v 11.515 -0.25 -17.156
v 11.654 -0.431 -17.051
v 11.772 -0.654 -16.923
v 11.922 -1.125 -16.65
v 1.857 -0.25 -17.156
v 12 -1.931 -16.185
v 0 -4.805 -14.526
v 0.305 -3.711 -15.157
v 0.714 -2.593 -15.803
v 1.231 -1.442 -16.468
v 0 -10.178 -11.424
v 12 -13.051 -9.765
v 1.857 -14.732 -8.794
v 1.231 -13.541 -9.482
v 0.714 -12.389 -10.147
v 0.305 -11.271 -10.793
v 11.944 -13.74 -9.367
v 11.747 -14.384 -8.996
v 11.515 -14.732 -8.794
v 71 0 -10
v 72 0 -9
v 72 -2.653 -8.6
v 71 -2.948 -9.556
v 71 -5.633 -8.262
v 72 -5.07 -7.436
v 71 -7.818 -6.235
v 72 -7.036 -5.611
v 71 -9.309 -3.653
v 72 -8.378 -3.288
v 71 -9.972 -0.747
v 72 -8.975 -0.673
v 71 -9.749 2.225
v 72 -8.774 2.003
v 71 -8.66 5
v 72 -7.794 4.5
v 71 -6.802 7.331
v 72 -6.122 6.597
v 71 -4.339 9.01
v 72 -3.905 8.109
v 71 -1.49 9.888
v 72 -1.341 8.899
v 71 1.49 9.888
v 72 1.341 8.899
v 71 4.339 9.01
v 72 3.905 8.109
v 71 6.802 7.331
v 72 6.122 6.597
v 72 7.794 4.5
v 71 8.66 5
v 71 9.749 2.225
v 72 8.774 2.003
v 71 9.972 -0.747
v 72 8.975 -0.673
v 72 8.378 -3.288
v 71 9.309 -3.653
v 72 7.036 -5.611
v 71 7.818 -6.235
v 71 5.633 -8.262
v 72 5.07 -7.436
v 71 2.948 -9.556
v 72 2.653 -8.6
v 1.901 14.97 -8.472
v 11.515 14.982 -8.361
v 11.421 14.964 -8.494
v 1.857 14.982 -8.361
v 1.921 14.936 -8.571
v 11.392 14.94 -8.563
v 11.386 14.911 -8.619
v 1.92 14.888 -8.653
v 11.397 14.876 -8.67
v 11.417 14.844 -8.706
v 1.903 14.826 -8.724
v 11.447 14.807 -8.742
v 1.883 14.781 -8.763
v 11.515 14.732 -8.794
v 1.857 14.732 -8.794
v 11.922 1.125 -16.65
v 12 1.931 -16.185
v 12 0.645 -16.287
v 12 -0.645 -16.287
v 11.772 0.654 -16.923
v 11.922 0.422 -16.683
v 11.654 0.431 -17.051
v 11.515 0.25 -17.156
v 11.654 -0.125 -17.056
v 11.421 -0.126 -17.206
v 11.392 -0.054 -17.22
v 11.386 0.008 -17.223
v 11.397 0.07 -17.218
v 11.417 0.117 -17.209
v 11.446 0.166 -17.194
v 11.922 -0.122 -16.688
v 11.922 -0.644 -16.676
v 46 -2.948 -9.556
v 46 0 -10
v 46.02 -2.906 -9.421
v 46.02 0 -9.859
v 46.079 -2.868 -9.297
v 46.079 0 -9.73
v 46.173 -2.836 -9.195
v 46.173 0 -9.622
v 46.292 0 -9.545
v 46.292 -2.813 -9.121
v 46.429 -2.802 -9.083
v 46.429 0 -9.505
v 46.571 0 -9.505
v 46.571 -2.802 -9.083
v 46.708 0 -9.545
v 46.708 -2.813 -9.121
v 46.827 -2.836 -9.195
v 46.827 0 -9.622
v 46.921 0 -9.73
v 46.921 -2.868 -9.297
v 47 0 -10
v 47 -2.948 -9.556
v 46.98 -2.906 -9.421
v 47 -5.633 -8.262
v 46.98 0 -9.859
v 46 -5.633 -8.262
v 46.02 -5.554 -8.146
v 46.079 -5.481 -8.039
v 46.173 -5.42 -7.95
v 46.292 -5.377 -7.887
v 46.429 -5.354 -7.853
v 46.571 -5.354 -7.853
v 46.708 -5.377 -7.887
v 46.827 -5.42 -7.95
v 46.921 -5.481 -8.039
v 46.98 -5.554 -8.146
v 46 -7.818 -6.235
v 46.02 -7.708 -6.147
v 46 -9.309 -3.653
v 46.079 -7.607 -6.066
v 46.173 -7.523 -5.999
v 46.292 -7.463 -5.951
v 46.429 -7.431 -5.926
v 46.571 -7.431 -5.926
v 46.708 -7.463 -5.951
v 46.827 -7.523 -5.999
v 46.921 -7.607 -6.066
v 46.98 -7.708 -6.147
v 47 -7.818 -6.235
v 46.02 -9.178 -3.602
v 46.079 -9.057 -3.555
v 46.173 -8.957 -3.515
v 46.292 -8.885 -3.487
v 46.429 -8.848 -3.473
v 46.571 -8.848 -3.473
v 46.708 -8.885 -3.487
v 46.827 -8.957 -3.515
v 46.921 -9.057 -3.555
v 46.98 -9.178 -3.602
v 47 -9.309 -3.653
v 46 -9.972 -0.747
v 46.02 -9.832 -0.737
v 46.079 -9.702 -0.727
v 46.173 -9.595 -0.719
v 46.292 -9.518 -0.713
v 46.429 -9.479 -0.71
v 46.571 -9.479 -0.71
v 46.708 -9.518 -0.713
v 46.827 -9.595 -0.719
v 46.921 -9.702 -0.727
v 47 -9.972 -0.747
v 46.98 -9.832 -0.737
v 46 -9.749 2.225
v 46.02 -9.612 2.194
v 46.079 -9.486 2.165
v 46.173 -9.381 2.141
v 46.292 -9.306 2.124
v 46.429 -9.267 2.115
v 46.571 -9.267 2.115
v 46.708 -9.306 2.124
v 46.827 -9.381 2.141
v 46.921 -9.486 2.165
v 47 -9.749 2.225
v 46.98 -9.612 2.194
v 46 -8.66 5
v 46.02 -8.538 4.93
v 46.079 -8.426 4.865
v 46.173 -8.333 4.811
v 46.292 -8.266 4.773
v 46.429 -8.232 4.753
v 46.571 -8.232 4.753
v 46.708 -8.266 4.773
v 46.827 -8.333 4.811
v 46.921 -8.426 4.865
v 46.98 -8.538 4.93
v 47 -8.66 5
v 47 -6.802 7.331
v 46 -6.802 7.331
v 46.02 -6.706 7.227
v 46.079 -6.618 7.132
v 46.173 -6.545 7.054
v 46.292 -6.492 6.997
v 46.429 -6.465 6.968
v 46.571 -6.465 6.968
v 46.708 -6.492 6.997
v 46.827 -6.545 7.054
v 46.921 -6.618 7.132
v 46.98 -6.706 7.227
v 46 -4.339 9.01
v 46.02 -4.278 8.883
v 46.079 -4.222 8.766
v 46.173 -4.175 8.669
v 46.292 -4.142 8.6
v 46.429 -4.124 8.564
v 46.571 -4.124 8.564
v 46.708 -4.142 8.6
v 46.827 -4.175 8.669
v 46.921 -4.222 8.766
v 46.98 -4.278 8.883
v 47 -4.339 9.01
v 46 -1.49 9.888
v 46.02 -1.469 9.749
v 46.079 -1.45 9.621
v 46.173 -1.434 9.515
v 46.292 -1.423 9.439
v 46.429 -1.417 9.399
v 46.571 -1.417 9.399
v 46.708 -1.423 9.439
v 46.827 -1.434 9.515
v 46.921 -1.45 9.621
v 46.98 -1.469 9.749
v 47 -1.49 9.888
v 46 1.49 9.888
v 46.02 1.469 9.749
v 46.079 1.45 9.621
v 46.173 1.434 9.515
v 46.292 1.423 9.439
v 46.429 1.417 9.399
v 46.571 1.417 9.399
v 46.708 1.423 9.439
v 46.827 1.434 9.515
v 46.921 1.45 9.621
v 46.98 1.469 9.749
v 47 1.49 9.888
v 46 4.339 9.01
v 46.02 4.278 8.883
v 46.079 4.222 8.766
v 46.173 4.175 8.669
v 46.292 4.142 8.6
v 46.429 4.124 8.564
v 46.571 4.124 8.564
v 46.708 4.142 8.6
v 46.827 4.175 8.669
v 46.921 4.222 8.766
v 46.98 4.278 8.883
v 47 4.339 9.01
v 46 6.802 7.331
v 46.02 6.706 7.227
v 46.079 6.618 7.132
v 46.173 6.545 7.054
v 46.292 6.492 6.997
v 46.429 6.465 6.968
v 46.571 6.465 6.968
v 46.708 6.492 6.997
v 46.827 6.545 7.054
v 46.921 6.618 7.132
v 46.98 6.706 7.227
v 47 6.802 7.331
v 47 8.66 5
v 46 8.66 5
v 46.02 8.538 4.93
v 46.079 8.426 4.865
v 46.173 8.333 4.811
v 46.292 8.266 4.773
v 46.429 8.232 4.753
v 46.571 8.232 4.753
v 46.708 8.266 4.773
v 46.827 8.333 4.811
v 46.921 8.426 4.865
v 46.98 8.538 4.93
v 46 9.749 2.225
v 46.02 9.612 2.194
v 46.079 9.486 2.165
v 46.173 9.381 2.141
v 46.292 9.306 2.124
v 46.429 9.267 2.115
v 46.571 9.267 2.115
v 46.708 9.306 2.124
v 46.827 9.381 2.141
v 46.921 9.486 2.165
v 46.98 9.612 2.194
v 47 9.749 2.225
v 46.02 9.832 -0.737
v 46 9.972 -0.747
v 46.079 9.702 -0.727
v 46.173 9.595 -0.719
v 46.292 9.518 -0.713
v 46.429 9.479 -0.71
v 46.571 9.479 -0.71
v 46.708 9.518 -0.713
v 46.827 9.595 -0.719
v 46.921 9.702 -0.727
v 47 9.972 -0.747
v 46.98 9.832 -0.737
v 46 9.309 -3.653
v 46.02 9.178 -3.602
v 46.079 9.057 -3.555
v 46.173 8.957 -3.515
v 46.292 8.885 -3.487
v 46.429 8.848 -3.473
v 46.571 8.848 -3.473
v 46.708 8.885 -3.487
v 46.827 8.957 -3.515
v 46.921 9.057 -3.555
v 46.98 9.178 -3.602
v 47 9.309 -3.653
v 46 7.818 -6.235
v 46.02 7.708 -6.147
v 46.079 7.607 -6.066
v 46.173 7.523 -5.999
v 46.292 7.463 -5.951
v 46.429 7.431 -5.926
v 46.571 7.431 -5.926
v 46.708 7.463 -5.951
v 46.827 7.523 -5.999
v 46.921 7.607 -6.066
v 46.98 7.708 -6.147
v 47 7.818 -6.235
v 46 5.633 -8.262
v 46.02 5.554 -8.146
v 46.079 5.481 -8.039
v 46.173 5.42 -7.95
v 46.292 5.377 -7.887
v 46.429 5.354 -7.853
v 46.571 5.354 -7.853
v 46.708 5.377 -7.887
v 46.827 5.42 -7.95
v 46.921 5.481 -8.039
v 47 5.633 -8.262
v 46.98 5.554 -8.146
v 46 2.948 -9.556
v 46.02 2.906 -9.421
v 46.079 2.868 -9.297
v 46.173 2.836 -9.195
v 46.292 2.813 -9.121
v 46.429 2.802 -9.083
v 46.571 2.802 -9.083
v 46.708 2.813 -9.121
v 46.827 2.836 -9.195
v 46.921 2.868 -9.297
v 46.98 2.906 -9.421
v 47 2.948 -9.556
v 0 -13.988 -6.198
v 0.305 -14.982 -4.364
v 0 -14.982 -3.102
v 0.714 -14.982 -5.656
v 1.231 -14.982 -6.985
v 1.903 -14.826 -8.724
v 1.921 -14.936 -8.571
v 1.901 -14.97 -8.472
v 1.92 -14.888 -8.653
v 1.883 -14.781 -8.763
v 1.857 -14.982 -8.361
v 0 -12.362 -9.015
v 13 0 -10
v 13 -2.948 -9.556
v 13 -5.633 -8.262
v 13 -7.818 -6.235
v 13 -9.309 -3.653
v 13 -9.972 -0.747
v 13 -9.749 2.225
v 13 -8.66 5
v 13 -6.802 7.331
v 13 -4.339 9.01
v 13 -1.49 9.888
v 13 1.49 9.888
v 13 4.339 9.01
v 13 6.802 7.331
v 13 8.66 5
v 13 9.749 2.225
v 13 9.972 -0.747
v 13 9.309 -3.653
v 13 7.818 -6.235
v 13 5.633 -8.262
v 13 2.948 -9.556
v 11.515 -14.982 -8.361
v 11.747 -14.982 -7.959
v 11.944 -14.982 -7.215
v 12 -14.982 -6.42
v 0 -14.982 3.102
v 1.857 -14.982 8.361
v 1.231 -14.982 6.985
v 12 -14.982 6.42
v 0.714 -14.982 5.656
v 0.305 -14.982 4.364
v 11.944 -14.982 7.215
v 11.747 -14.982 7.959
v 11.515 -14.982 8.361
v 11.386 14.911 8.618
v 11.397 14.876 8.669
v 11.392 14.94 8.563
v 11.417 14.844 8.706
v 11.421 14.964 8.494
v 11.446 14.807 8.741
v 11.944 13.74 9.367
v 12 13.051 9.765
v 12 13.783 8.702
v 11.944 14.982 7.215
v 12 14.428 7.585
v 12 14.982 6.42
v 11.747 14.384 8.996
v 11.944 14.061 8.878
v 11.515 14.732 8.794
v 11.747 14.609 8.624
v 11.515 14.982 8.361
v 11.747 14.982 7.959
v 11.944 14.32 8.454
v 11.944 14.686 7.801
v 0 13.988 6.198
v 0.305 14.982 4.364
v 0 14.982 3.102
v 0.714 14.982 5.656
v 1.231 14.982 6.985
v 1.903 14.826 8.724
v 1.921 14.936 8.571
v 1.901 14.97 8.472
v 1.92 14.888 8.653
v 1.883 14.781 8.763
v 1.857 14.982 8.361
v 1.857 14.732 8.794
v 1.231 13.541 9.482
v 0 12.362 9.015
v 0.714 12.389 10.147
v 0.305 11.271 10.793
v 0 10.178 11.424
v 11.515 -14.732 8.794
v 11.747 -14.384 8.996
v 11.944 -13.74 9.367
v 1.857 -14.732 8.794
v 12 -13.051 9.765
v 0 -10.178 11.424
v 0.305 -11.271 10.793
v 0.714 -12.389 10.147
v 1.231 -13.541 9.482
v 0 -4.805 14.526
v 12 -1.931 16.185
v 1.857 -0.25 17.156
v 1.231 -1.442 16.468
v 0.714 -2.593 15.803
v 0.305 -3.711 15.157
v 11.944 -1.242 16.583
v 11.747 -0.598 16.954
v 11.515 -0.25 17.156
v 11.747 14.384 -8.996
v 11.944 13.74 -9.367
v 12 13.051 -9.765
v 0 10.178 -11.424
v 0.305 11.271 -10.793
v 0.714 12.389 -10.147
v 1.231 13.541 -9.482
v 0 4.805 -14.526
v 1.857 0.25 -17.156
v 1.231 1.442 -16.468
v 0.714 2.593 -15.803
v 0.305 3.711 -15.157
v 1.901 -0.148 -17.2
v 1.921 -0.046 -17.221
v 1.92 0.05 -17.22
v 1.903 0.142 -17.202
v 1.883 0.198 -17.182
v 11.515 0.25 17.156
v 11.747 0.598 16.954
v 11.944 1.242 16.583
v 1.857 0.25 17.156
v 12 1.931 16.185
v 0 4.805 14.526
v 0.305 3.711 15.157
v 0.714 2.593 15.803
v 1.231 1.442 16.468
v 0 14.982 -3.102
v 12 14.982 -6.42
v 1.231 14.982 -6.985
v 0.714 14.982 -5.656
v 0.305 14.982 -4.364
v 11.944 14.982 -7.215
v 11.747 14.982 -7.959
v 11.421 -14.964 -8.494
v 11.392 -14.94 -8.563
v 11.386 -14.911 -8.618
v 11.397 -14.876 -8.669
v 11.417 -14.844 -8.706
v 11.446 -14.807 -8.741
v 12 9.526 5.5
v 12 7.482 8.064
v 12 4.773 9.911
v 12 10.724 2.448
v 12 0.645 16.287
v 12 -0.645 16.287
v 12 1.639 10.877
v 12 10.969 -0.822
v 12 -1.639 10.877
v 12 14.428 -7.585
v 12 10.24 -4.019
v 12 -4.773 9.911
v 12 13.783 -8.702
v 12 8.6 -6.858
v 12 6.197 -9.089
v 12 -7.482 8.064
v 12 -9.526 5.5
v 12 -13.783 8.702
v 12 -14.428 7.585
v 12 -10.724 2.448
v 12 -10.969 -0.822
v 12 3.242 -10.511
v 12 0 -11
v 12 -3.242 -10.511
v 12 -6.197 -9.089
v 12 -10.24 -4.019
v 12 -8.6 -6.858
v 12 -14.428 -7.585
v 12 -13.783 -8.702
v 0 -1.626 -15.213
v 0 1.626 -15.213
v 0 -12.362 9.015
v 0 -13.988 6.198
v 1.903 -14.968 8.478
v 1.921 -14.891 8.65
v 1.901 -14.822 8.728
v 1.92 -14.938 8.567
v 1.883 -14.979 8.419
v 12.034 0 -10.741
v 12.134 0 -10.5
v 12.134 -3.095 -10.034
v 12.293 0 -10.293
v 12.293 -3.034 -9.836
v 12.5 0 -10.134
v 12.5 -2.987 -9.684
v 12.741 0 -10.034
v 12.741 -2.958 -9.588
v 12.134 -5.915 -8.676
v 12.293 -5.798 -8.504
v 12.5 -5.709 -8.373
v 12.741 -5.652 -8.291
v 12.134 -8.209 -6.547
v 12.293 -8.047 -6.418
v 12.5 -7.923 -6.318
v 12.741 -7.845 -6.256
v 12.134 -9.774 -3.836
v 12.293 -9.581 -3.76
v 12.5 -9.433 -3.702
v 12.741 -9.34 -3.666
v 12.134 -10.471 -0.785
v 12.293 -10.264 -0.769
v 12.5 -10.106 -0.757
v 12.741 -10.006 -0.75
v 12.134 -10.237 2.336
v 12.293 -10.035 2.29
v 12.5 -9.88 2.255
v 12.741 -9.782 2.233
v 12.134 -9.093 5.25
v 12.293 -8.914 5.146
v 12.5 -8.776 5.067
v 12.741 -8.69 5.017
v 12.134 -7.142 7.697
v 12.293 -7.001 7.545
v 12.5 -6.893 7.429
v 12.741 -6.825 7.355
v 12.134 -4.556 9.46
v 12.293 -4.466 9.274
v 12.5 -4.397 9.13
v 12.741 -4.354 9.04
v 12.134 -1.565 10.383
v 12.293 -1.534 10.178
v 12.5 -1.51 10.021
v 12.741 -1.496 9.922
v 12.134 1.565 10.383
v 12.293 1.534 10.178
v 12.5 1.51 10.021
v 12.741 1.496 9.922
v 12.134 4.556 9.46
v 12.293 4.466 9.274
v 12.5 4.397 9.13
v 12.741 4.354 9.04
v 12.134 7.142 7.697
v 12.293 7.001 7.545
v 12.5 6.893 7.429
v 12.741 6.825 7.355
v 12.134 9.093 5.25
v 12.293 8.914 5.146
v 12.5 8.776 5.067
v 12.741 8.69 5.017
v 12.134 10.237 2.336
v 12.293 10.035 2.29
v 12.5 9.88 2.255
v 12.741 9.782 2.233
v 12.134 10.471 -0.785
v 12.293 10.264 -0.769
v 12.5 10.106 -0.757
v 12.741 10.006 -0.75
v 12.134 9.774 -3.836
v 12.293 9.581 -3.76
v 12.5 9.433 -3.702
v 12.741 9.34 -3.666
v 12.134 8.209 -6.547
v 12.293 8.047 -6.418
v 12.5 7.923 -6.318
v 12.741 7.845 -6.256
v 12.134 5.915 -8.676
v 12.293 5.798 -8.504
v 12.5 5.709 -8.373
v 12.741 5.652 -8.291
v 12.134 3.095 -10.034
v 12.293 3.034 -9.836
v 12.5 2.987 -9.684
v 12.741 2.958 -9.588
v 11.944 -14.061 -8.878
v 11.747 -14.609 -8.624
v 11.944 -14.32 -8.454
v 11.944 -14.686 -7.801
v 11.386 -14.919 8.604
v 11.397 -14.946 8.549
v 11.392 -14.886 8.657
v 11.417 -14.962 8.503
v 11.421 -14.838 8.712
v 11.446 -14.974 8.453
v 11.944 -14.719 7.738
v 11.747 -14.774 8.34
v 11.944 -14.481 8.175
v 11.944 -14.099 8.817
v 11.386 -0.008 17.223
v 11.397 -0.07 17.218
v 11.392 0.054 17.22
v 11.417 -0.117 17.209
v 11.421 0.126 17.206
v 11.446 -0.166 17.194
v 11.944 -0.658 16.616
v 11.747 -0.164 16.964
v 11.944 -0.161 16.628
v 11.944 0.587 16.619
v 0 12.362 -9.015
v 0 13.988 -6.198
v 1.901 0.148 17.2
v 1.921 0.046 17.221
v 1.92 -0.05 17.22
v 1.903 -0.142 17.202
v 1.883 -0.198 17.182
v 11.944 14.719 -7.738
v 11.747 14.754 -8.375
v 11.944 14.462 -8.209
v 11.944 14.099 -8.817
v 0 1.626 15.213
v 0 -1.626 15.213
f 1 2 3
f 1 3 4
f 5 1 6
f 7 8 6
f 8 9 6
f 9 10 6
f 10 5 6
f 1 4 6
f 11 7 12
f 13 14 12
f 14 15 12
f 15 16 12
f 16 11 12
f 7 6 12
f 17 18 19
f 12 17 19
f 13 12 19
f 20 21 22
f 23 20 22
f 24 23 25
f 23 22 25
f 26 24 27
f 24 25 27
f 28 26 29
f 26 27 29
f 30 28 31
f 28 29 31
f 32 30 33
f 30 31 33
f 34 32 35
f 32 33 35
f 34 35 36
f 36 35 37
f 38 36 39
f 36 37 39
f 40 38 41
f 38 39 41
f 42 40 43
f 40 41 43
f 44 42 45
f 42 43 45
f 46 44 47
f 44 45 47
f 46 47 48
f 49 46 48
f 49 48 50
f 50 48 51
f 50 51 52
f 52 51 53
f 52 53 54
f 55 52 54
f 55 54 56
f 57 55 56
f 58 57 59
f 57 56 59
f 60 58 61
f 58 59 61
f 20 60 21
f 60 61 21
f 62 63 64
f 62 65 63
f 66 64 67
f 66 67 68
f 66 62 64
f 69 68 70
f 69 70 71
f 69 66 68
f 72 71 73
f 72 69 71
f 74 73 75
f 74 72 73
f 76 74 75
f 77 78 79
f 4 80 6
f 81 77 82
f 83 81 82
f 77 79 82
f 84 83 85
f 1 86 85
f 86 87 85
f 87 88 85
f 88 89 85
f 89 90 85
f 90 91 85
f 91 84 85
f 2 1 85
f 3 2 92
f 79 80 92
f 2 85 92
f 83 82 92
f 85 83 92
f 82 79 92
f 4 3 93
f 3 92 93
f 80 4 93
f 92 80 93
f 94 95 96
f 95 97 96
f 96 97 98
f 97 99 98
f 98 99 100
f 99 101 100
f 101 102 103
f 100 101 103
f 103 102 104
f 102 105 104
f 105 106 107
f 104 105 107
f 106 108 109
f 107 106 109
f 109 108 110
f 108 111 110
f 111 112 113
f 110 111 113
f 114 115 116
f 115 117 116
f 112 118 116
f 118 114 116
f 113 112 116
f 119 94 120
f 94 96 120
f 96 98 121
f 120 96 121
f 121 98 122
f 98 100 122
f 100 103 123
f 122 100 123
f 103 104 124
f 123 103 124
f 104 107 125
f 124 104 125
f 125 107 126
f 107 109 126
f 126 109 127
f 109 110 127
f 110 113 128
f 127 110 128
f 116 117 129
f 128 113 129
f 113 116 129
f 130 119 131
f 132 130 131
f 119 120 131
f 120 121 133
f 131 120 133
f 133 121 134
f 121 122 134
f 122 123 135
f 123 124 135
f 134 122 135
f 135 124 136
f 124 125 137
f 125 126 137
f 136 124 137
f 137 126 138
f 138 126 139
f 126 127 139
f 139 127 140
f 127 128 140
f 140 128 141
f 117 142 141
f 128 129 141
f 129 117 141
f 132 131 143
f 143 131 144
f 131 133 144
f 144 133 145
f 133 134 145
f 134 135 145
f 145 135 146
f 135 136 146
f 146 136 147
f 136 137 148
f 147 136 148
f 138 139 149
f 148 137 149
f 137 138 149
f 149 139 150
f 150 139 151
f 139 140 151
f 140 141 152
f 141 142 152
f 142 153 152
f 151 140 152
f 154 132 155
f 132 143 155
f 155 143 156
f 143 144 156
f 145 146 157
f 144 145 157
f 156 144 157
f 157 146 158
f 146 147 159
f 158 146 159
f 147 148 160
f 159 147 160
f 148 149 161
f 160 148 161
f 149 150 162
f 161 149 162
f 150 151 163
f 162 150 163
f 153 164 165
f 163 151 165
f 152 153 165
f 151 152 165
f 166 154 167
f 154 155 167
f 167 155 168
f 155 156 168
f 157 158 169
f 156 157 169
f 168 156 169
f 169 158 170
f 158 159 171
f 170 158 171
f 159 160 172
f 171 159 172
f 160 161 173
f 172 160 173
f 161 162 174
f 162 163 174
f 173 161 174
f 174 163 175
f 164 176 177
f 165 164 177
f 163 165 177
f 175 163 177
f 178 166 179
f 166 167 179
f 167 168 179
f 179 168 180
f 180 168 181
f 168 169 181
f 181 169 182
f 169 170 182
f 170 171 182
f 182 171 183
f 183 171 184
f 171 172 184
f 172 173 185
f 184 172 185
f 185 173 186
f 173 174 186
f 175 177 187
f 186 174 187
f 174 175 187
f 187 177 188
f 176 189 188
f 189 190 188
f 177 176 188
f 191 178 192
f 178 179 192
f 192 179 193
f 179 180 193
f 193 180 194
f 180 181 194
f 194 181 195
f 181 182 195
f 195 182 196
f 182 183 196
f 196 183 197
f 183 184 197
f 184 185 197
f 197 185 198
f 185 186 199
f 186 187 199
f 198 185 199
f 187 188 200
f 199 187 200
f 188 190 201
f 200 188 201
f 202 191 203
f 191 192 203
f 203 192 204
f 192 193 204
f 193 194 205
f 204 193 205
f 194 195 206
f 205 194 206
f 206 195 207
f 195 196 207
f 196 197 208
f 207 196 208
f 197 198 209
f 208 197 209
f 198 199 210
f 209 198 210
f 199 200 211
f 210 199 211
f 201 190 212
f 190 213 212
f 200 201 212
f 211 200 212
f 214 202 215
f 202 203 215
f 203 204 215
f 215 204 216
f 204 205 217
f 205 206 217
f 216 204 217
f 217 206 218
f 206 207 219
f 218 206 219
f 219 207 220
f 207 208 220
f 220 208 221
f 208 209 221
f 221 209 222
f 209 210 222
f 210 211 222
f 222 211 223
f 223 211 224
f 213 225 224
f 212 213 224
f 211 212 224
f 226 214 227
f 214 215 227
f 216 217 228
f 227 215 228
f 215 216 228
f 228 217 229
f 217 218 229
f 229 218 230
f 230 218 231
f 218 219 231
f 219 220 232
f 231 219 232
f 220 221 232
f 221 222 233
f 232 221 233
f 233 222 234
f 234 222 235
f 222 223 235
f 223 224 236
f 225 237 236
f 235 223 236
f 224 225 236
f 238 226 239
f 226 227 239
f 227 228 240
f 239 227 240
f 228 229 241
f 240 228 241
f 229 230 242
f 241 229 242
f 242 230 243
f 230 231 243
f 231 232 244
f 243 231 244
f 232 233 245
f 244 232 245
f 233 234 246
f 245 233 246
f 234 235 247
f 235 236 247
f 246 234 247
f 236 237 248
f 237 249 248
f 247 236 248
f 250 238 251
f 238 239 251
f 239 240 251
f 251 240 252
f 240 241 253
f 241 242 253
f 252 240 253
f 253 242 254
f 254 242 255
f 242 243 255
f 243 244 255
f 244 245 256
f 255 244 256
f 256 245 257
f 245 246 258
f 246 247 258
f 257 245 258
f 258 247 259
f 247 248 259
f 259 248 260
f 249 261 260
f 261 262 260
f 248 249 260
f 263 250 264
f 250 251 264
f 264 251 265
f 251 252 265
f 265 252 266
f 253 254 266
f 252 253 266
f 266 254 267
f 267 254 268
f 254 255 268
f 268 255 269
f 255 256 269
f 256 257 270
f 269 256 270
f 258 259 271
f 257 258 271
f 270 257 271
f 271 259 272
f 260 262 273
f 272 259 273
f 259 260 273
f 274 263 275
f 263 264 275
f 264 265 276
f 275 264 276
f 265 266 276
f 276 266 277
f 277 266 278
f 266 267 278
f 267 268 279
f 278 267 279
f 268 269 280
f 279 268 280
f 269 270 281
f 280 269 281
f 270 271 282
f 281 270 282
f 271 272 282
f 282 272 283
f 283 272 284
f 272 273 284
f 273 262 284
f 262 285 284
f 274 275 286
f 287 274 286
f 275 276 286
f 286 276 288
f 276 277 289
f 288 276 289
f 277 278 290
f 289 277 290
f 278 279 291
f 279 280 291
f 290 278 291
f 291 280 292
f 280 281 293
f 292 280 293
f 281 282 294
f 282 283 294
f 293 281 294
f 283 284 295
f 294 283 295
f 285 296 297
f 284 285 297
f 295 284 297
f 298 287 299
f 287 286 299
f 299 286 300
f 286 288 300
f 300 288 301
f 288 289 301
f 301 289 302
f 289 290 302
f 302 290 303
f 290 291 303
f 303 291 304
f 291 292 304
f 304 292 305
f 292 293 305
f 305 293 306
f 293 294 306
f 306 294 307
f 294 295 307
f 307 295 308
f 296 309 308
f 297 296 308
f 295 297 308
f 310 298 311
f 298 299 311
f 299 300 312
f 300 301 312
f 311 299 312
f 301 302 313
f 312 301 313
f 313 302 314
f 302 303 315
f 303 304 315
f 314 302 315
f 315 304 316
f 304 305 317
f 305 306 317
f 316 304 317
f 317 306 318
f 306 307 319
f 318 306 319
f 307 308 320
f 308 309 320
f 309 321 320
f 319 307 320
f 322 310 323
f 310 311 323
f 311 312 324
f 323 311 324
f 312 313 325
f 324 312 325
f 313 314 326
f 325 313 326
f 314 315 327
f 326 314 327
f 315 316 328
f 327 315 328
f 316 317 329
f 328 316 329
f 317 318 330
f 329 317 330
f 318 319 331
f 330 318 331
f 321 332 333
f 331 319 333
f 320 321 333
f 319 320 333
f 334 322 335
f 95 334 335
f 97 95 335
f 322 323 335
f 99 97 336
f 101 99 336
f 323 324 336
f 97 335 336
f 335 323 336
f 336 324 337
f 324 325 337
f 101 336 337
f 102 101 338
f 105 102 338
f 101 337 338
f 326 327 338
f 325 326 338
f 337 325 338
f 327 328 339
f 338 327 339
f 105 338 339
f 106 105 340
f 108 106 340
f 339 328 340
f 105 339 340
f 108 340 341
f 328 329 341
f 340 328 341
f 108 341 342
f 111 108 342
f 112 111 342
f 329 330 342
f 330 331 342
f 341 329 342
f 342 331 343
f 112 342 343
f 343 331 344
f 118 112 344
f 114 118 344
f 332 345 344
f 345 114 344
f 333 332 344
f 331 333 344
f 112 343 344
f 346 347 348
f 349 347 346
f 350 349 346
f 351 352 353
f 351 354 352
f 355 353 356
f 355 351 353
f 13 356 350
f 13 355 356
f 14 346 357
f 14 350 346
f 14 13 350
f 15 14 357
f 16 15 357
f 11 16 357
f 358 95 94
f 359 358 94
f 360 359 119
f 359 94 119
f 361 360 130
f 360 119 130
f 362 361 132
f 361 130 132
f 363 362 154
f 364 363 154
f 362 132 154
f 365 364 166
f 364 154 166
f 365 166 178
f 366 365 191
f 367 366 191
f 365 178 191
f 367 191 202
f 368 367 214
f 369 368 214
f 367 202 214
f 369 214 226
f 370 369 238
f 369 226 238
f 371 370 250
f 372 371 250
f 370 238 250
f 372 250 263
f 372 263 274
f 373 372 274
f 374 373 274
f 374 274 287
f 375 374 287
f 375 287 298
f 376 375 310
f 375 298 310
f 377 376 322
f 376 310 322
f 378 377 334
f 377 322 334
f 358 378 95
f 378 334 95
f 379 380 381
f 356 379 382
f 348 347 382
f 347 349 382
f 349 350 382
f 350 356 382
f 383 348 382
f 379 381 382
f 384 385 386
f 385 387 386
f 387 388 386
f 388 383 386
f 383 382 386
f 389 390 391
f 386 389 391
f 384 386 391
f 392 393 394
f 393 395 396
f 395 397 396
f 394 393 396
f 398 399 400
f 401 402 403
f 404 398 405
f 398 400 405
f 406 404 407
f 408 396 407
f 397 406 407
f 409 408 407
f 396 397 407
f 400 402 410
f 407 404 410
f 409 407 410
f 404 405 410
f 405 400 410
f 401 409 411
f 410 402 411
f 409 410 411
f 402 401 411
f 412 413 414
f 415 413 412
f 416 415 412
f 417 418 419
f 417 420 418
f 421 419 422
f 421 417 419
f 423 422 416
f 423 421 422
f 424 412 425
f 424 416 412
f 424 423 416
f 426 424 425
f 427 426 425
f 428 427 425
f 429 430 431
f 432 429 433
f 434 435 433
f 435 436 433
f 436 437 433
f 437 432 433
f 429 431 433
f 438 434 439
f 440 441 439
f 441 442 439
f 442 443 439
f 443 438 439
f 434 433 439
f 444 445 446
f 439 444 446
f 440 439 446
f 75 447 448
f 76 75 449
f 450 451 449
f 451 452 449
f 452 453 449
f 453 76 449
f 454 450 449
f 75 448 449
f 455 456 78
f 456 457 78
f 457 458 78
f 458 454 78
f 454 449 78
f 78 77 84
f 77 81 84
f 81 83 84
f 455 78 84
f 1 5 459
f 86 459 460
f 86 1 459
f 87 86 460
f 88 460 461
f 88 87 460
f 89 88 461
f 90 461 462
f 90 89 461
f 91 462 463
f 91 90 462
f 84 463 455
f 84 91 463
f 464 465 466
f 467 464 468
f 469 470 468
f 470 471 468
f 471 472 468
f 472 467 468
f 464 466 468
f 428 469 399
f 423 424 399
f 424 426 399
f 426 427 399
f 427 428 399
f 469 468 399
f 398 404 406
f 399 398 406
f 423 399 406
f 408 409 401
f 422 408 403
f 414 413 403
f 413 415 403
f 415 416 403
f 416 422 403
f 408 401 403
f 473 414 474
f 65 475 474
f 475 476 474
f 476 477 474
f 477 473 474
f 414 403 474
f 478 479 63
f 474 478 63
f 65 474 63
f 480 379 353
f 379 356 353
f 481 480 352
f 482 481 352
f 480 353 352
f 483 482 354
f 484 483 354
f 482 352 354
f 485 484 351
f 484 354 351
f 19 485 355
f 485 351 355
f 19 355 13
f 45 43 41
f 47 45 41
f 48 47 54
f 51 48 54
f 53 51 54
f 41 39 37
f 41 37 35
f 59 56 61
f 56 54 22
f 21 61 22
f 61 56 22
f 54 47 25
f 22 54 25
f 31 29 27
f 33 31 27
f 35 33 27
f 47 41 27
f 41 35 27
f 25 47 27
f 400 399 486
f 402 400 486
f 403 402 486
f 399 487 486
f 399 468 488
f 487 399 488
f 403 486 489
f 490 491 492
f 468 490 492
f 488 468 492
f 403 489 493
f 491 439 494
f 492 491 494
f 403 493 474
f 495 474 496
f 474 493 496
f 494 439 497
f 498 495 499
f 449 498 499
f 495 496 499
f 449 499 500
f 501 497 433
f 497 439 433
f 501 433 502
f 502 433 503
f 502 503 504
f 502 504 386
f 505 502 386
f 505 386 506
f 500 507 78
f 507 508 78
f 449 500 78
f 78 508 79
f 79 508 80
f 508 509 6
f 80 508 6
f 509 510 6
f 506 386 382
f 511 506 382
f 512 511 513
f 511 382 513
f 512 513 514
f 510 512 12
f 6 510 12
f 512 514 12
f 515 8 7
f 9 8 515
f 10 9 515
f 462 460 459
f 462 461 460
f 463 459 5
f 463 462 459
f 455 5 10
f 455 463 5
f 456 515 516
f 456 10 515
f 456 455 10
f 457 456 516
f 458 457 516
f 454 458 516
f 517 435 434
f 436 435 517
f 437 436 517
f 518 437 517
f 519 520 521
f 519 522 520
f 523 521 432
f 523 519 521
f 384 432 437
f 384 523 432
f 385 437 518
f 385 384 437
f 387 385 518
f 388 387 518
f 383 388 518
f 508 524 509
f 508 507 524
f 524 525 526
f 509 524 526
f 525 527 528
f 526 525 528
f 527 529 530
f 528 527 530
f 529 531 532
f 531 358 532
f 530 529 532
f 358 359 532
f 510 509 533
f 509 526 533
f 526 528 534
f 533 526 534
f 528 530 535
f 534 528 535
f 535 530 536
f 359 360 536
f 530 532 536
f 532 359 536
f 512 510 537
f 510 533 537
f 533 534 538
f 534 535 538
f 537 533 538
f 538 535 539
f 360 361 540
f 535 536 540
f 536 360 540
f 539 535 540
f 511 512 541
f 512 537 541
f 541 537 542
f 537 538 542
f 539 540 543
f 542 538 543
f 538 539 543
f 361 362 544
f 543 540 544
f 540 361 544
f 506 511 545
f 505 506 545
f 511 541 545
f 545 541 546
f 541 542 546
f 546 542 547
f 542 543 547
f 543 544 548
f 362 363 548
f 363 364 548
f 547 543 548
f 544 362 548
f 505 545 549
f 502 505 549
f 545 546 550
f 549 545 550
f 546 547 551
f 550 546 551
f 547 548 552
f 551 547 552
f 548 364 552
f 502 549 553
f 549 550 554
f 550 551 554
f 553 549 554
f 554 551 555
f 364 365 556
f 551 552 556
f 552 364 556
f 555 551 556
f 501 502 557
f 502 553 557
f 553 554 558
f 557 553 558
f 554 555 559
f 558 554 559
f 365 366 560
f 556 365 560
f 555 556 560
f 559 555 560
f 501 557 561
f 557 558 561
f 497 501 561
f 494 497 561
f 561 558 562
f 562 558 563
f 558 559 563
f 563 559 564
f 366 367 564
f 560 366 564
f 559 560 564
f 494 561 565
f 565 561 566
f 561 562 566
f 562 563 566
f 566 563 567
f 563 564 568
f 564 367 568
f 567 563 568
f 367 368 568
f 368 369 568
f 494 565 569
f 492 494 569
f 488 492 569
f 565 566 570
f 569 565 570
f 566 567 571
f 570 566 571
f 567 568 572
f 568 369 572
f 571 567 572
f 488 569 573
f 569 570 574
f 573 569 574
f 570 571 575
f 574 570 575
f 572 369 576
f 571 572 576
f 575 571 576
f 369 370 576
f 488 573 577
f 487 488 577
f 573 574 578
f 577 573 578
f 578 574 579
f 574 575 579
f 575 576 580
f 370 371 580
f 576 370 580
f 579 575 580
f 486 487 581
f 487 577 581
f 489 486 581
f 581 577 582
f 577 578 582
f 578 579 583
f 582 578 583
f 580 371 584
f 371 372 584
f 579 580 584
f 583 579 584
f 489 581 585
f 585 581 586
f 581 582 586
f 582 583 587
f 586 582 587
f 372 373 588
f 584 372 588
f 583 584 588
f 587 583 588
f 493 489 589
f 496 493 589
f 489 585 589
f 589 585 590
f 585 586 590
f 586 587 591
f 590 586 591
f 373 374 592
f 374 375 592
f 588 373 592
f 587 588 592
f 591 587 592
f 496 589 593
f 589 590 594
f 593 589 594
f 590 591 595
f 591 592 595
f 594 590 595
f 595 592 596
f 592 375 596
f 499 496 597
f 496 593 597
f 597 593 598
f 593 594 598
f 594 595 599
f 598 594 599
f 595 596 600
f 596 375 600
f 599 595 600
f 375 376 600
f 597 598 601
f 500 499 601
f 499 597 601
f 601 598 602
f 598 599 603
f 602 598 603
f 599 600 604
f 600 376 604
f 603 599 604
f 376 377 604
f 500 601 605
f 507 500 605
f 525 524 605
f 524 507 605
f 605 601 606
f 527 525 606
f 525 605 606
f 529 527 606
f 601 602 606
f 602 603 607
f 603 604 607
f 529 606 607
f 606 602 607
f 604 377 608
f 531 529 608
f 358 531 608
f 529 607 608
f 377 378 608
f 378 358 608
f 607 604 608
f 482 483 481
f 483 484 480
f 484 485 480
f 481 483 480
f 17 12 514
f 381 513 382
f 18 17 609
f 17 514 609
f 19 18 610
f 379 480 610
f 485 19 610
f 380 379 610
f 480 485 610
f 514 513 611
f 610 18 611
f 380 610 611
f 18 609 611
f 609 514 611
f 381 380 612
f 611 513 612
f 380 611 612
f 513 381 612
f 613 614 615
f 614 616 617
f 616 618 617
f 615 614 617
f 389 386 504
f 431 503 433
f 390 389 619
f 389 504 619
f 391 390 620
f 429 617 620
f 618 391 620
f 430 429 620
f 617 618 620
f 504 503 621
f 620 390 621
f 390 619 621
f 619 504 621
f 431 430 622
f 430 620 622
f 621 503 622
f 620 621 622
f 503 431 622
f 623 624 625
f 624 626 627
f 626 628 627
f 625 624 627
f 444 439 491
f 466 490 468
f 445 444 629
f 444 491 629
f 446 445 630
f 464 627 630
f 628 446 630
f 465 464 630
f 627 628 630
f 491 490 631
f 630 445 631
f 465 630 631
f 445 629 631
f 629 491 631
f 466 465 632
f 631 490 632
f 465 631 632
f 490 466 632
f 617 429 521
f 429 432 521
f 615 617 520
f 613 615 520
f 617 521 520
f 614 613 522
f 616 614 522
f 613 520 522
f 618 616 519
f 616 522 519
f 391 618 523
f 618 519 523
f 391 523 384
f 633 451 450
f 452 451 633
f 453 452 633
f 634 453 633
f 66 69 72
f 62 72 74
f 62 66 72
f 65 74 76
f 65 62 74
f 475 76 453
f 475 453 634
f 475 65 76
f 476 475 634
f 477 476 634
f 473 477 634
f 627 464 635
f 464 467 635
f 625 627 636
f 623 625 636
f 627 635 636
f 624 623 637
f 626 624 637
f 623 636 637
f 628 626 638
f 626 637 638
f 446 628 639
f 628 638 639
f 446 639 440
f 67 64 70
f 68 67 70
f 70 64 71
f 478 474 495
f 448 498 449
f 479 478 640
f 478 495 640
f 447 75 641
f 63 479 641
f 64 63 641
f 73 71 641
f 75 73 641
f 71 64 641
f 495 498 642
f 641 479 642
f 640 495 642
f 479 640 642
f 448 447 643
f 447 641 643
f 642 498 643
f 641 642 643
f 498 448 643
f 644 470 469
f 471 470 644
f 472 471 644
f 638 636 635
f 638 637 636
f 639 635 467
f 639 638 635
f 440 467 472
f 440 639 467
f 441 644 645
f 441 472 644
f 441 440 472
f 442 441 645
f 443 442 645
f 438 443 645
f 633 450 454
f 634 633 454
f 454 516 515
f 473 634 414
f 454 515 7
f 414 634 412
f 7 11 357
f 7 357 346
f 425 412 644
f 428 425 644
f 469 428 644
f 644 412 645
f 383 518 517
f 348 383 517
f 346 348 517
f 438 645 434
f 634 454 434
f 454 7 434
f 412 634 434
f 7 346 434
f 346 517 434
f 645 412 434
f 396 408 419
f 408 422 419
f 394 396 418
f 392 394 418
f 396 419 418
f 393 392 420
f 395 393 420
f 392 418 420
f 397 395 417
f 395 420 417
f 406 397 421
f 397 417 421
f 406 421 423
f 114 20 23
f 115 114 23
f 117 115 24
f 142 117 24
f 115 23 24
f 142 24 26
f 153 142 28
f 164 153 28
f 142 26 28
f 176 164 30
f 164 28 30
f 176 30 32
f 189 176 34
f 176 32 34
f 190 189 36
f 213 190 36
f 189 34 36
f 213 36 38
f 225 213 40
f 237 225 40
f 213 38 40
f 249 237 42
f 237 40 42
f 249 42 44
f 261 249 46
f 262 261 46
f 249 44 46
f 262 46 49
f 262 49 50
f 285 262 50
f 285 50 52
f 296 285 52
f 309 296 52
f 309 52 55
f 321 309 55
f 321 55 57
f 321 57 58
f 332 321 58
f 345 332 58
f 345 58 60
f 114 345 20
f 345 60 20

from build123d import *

# Parameters (mm, degrees)
REDONDEO1_R           = 1
CHAFL_N1_SIZE         = 1
CORTAR_EXTRUIR1_START = -12.000013
CROQUIS2_R            = 18.122324433
CORTAR_EXTRUIR1_DEPTH = 12.000014
REDONDEO3_R           = 0.5


with BuildPart() as part:
    # Croquis1 → Revolución1 (revolve)
    with BuildSketch(Plane.XY, mode=Mode.PRIVATE) as revoluci_n1_sk:
        with BuildLine():
            Line((0, 0), (0, 17.3))
            Line((0, 17.3), (12, 17.3))
            Line((12, 17.3), (12, 10))
            Line((12, 10), (46, 10))
            ThreePointArc((46, 10), (46.5, 9.5), (47, 10))
            Line((47, 10), (72, 10))
            Line((72, 10), (72, 0))
            Line((72, 0), (0, 0))
        make_face()
    revolve(revoluci_n1_sk.sketch.rotate(Axis((72, 0, 0), (-1, 0, 0)), 90), axis=Axis((72, 0, 0), (-1, 0, 0)))

    # Redondeo1
    redondeo1_edges = [part.edges().sort_by_distance(p)[0] for p in [
        (12, 0, 17.3),
        (12, 0, 10),
    ]]
    fillet(redondeo1_edges, radius=REDONDEO1_R)

    # Chaflán1
    chafl_n1_edges = [part.edges().sort_by_distance(p)[0] for p in [
        (72, 0, 10),
    ]]
    chamfer(chafl_n1_edges, length=CHAFL_N1_SIZE)

    # Croquis4 → Cortar-Revolución1 (revolve, cut)
    with BuildSketch(Plane.XY, mode=Mode.PRIVATE) as cortar_revoluci_n1_sk:
        Polygon((0, 17.3), (0, 15.3), (2, 17.3), align=None)
    revolve(cortar_revoluci_n1_sk.sketch.rotate(Axis((0, 0, 0), (1, 0, 0)), 270), axis=Axis((0, 0, 0), (1, 0, 0)), mode=Mode.SUBTRACT)

    # Croquis2 → Cortar-Extruir1 (cut)
    with BuildSketch(Plane.ZY.offset(CORTAR_EXTRUIR1_START)):
        Circle(CROQUIS2_R)
        Polygon((8.65, 14.982239485), (-8.65, 14.982239485), (-17.3, 0), (-8.65, -14.982239485), (8.65, -14.982239485), (17.3, 0), align=None, mode=Mode.SUBTRACT)
    extrude(amount=CORTAR_EXTRUIR1_DEPTH, mode=Mode.SUBTRACT)

    # Redondeo3
    redondeo3_edges = [part.edges().sort_by_distance(p)[0] for p in [
        (6.5, 14.982239485, 8.65),
        (6.5, 0, 17.3),
        (6.5, -14.982239485, 8.65),
        (6.5, 14.982239485, -8.65),
        (6.5, 0, -17.3),
        (6.5, -14.982239485, -8.65),
    ]]
    fillet(redondeo3_edges, radius=REDONDEO3_R)


solid = part.part
